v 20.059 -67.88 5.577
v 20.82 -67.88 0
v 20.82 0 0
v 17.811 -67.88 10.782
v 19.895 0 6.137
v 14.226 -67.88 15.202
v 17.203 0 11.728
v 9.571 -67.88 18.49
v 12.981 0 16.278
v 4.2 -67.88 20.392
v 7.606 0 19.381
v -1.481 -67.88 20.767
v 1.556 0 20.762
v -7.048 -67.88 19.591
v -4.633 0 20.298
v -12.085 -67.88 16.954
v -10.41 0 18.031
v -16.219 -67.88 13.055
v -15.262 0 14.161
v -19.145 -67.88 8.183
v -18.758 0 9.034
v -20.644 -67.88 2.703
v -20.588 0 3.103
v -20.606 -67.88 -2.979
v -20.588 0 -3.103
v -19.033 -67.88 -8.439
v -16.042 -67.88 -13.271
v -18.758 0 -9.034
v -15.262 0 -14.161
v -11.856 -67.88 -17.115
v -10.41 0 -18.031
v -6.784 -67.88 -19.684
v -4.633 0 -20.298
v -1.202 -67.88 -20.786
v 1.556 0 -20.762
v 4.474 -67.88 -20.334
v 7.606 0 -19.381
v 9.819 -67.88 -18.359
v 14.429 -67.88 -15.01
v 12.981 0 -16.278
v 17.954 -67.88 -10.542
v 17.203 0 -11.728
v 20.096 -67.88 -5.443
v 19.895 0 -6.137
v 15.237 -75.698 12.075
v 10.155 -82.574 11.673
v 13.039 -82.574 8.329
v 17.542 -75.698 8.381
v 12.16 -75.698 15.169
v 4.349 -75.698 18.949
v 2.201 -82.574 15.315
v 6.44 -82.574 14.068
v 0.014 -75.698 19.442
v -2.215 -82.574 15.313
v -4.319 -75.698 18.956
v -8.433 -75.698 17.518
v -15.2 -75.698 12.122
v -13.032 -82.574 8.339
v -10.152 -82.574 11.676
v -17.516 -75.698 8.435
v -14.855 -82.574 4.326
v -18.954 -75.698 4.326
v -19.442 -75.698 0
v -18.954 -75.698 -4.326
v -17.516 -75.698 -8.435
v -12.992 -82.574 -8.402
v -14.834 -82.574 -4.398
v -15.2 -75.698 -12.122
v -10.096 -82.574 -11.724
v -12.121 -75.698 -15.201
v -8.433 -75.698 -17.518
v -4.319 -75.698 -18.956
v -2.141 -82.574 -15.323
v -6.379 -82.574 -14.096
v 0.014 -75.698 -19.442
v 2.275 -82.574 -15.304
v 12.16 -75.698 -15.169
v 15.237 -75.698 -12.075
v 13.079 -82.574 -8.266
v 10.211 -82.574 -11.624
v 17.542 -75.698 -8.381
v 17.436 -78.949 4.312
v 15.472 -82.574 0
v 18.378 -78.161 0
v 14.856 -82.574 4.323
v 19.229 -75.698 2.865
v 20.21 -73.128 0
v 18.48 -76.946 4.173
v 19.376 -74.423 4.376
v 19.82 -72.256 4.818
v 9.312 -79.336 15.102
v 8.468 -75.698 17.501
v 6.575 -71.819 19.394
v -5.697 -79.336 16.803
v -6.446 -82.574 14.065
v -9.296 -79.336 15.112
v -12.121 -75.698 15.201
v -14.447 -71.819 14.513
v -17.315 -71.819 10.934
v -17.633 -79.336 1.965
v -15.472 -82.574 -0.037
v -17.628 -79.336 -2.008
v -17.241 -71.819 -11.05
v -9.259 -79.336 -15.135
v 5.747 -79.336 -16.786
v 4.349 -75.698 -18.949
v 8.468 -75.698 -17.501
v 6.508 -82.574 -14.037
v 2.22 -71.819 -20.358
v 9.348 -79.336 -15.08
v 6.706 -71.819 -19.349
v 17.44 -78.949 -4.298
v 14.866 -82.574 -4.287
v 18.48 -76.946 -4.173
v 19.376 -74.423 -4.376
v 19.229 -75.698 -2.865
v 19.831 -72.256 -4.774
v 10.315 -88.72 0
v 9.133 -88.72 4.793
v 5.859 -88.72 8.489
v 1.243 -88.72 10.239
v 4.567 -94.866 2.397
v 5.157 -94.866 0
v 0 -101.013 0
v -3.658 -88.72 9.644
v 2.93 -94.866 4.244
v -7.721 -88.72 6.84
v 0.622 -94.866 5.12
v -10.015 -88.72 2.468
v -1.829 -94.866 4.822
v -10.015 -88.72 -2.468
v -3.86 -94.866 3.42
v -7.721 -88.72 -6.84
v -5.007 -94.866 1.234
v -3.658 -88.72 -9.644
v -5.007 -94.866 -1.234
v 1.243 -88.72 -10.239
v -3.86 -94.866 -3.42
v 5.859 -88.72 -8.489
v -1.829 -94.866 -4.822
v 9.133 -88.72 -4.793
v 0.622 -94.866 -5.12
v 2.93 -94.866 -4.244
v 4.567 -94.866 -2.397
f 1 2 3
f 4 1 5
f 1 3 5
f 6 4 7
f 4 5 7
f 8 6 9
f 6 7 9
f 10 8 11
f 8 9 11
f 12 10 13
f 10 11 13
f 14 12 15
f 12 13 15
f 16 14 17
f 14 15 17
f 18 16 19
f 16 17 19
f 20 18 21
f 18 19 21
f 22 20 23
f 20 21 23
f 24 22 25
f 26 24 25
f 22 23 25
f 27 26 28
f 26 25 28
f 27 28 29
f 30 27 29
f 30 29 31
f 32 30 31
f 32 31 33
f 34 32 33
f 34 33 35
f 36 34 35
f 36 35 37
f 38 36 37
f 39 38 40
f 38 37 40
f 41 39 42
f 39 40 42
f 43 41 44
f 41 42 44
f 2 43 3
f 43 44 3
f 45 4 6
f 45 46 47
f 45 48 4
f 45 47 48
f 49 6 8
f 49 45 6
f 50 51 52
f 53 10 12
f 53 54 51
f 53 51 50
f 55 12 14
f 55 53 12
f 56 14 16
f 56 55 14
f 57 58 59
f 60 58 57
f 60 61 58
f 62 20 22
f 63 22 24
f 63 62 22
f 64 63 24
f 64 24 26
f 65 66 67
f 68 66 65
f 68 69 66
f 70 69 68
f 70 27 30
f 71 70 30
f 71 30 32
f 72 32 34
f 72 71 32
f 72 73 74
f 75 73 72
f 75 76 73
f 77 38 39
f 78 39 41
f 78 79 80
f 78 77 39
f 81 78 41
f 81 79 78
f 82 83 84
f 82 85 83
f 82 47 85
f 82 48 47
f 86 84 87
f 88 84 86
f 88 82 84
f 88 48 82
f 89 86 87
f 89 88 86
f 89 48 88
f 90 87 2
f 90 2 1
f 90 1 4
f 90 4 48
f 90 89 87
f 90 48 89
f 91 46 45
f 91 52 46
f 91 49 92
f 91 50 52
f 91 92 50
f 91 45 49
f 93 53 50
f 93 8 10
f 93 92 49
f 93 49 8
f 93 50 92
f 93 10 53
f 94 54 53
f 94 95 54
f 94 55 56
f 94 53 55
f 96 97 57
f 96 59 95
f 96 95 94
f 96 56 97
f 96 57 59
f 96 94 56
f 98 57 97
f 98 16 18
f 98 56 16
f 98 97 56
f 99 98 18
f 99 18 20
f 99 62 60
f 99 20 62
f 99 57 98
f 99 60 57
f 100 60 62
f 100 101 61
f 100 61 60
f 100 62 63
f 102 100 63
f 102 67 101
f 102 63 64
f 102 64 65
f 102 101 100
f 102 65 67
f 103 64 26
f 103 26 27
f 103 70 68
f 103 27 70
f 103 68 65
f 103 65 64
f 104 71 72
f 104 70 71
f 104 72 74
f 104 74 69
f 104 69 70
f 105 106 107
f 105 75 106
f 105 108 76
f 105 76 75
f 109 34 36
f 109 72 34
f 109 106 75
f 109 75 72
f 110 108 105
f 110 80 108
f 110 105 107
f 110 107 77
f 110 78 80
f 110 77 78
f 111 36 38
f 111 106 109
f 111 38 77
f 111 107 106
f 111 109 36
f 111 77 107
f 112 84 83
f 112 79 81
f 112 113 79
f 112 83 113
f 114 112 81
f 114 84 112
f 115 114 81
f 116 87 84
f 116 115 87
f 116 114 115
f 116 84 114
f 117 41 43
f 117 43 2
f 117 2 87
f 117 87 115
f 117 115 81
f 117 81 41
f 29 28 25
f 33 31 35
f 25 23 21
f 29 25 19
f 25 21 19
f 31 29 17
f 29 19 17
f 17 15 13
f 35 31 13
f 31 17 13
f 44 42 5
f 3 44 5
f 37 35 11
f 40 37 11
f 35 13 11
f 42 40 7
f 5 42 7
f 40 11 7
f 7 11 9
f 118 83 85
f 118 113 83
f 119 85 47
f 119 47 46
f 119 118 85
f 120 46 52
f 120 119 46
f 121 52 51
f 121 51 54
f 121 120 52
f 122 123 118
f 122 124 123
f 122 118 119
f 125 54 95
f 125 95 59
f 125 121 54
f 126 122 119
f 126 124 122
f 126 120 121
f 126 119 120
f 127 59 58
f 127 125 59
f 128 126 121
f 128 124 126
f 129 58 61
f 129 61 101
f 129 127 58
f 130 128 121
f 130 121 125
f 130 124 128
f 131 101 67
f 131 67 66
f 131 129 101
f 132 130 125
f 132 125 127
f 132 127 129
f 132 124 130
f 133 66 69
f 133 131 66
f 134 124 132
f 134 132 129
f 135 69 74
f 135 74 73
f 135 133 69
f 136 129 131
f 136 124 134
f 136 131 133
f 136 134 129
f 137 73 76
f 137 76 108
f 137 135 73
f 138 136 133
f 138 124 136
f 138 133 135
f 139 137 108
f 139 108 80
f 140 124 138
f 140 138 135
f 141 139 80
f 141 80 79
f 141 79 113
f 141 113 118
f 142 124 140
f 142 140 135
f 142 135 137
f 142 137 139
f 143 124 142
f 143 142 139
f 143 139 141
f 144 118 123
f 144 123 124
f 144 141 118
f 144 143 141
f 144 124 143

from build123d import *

# Parameters (mm, degrees)
F0_R      = 20.8202658932
F1_DEPTH  = 76.2
F1_FACE_R = 20.8202658932
F3_R      = 22.86


# Not quite as in the source:
# - an extrude whose draft closes it to a point is written as a loft to that point


with BuildPart() as f1:
    # F0 (on Front) → F1 (new body)
    with BuildSketch(Plane.XZ):
        Circle(F0_R)
    extrude(amount=F1_DEPTH)

    # F1_face (on face) → F2 section 0
    with BuildSketch(Plane.XZ.offset(76.2), mode=Mode.PRIVATE) as f2_s0:
        Circle(F1_FACE_R)
    loft([f2_s0.sketch, Vertex(0, -101.0126266769, 0)], ruled=True)

    # F3
    f3_edges = [f1.edges().sort_by_distance(p)[0] for p in [
        (-20.820266, -76.2, 0),
    ]]
    fillet(f3_edges, radius=F3_R)


solid = f1.part
